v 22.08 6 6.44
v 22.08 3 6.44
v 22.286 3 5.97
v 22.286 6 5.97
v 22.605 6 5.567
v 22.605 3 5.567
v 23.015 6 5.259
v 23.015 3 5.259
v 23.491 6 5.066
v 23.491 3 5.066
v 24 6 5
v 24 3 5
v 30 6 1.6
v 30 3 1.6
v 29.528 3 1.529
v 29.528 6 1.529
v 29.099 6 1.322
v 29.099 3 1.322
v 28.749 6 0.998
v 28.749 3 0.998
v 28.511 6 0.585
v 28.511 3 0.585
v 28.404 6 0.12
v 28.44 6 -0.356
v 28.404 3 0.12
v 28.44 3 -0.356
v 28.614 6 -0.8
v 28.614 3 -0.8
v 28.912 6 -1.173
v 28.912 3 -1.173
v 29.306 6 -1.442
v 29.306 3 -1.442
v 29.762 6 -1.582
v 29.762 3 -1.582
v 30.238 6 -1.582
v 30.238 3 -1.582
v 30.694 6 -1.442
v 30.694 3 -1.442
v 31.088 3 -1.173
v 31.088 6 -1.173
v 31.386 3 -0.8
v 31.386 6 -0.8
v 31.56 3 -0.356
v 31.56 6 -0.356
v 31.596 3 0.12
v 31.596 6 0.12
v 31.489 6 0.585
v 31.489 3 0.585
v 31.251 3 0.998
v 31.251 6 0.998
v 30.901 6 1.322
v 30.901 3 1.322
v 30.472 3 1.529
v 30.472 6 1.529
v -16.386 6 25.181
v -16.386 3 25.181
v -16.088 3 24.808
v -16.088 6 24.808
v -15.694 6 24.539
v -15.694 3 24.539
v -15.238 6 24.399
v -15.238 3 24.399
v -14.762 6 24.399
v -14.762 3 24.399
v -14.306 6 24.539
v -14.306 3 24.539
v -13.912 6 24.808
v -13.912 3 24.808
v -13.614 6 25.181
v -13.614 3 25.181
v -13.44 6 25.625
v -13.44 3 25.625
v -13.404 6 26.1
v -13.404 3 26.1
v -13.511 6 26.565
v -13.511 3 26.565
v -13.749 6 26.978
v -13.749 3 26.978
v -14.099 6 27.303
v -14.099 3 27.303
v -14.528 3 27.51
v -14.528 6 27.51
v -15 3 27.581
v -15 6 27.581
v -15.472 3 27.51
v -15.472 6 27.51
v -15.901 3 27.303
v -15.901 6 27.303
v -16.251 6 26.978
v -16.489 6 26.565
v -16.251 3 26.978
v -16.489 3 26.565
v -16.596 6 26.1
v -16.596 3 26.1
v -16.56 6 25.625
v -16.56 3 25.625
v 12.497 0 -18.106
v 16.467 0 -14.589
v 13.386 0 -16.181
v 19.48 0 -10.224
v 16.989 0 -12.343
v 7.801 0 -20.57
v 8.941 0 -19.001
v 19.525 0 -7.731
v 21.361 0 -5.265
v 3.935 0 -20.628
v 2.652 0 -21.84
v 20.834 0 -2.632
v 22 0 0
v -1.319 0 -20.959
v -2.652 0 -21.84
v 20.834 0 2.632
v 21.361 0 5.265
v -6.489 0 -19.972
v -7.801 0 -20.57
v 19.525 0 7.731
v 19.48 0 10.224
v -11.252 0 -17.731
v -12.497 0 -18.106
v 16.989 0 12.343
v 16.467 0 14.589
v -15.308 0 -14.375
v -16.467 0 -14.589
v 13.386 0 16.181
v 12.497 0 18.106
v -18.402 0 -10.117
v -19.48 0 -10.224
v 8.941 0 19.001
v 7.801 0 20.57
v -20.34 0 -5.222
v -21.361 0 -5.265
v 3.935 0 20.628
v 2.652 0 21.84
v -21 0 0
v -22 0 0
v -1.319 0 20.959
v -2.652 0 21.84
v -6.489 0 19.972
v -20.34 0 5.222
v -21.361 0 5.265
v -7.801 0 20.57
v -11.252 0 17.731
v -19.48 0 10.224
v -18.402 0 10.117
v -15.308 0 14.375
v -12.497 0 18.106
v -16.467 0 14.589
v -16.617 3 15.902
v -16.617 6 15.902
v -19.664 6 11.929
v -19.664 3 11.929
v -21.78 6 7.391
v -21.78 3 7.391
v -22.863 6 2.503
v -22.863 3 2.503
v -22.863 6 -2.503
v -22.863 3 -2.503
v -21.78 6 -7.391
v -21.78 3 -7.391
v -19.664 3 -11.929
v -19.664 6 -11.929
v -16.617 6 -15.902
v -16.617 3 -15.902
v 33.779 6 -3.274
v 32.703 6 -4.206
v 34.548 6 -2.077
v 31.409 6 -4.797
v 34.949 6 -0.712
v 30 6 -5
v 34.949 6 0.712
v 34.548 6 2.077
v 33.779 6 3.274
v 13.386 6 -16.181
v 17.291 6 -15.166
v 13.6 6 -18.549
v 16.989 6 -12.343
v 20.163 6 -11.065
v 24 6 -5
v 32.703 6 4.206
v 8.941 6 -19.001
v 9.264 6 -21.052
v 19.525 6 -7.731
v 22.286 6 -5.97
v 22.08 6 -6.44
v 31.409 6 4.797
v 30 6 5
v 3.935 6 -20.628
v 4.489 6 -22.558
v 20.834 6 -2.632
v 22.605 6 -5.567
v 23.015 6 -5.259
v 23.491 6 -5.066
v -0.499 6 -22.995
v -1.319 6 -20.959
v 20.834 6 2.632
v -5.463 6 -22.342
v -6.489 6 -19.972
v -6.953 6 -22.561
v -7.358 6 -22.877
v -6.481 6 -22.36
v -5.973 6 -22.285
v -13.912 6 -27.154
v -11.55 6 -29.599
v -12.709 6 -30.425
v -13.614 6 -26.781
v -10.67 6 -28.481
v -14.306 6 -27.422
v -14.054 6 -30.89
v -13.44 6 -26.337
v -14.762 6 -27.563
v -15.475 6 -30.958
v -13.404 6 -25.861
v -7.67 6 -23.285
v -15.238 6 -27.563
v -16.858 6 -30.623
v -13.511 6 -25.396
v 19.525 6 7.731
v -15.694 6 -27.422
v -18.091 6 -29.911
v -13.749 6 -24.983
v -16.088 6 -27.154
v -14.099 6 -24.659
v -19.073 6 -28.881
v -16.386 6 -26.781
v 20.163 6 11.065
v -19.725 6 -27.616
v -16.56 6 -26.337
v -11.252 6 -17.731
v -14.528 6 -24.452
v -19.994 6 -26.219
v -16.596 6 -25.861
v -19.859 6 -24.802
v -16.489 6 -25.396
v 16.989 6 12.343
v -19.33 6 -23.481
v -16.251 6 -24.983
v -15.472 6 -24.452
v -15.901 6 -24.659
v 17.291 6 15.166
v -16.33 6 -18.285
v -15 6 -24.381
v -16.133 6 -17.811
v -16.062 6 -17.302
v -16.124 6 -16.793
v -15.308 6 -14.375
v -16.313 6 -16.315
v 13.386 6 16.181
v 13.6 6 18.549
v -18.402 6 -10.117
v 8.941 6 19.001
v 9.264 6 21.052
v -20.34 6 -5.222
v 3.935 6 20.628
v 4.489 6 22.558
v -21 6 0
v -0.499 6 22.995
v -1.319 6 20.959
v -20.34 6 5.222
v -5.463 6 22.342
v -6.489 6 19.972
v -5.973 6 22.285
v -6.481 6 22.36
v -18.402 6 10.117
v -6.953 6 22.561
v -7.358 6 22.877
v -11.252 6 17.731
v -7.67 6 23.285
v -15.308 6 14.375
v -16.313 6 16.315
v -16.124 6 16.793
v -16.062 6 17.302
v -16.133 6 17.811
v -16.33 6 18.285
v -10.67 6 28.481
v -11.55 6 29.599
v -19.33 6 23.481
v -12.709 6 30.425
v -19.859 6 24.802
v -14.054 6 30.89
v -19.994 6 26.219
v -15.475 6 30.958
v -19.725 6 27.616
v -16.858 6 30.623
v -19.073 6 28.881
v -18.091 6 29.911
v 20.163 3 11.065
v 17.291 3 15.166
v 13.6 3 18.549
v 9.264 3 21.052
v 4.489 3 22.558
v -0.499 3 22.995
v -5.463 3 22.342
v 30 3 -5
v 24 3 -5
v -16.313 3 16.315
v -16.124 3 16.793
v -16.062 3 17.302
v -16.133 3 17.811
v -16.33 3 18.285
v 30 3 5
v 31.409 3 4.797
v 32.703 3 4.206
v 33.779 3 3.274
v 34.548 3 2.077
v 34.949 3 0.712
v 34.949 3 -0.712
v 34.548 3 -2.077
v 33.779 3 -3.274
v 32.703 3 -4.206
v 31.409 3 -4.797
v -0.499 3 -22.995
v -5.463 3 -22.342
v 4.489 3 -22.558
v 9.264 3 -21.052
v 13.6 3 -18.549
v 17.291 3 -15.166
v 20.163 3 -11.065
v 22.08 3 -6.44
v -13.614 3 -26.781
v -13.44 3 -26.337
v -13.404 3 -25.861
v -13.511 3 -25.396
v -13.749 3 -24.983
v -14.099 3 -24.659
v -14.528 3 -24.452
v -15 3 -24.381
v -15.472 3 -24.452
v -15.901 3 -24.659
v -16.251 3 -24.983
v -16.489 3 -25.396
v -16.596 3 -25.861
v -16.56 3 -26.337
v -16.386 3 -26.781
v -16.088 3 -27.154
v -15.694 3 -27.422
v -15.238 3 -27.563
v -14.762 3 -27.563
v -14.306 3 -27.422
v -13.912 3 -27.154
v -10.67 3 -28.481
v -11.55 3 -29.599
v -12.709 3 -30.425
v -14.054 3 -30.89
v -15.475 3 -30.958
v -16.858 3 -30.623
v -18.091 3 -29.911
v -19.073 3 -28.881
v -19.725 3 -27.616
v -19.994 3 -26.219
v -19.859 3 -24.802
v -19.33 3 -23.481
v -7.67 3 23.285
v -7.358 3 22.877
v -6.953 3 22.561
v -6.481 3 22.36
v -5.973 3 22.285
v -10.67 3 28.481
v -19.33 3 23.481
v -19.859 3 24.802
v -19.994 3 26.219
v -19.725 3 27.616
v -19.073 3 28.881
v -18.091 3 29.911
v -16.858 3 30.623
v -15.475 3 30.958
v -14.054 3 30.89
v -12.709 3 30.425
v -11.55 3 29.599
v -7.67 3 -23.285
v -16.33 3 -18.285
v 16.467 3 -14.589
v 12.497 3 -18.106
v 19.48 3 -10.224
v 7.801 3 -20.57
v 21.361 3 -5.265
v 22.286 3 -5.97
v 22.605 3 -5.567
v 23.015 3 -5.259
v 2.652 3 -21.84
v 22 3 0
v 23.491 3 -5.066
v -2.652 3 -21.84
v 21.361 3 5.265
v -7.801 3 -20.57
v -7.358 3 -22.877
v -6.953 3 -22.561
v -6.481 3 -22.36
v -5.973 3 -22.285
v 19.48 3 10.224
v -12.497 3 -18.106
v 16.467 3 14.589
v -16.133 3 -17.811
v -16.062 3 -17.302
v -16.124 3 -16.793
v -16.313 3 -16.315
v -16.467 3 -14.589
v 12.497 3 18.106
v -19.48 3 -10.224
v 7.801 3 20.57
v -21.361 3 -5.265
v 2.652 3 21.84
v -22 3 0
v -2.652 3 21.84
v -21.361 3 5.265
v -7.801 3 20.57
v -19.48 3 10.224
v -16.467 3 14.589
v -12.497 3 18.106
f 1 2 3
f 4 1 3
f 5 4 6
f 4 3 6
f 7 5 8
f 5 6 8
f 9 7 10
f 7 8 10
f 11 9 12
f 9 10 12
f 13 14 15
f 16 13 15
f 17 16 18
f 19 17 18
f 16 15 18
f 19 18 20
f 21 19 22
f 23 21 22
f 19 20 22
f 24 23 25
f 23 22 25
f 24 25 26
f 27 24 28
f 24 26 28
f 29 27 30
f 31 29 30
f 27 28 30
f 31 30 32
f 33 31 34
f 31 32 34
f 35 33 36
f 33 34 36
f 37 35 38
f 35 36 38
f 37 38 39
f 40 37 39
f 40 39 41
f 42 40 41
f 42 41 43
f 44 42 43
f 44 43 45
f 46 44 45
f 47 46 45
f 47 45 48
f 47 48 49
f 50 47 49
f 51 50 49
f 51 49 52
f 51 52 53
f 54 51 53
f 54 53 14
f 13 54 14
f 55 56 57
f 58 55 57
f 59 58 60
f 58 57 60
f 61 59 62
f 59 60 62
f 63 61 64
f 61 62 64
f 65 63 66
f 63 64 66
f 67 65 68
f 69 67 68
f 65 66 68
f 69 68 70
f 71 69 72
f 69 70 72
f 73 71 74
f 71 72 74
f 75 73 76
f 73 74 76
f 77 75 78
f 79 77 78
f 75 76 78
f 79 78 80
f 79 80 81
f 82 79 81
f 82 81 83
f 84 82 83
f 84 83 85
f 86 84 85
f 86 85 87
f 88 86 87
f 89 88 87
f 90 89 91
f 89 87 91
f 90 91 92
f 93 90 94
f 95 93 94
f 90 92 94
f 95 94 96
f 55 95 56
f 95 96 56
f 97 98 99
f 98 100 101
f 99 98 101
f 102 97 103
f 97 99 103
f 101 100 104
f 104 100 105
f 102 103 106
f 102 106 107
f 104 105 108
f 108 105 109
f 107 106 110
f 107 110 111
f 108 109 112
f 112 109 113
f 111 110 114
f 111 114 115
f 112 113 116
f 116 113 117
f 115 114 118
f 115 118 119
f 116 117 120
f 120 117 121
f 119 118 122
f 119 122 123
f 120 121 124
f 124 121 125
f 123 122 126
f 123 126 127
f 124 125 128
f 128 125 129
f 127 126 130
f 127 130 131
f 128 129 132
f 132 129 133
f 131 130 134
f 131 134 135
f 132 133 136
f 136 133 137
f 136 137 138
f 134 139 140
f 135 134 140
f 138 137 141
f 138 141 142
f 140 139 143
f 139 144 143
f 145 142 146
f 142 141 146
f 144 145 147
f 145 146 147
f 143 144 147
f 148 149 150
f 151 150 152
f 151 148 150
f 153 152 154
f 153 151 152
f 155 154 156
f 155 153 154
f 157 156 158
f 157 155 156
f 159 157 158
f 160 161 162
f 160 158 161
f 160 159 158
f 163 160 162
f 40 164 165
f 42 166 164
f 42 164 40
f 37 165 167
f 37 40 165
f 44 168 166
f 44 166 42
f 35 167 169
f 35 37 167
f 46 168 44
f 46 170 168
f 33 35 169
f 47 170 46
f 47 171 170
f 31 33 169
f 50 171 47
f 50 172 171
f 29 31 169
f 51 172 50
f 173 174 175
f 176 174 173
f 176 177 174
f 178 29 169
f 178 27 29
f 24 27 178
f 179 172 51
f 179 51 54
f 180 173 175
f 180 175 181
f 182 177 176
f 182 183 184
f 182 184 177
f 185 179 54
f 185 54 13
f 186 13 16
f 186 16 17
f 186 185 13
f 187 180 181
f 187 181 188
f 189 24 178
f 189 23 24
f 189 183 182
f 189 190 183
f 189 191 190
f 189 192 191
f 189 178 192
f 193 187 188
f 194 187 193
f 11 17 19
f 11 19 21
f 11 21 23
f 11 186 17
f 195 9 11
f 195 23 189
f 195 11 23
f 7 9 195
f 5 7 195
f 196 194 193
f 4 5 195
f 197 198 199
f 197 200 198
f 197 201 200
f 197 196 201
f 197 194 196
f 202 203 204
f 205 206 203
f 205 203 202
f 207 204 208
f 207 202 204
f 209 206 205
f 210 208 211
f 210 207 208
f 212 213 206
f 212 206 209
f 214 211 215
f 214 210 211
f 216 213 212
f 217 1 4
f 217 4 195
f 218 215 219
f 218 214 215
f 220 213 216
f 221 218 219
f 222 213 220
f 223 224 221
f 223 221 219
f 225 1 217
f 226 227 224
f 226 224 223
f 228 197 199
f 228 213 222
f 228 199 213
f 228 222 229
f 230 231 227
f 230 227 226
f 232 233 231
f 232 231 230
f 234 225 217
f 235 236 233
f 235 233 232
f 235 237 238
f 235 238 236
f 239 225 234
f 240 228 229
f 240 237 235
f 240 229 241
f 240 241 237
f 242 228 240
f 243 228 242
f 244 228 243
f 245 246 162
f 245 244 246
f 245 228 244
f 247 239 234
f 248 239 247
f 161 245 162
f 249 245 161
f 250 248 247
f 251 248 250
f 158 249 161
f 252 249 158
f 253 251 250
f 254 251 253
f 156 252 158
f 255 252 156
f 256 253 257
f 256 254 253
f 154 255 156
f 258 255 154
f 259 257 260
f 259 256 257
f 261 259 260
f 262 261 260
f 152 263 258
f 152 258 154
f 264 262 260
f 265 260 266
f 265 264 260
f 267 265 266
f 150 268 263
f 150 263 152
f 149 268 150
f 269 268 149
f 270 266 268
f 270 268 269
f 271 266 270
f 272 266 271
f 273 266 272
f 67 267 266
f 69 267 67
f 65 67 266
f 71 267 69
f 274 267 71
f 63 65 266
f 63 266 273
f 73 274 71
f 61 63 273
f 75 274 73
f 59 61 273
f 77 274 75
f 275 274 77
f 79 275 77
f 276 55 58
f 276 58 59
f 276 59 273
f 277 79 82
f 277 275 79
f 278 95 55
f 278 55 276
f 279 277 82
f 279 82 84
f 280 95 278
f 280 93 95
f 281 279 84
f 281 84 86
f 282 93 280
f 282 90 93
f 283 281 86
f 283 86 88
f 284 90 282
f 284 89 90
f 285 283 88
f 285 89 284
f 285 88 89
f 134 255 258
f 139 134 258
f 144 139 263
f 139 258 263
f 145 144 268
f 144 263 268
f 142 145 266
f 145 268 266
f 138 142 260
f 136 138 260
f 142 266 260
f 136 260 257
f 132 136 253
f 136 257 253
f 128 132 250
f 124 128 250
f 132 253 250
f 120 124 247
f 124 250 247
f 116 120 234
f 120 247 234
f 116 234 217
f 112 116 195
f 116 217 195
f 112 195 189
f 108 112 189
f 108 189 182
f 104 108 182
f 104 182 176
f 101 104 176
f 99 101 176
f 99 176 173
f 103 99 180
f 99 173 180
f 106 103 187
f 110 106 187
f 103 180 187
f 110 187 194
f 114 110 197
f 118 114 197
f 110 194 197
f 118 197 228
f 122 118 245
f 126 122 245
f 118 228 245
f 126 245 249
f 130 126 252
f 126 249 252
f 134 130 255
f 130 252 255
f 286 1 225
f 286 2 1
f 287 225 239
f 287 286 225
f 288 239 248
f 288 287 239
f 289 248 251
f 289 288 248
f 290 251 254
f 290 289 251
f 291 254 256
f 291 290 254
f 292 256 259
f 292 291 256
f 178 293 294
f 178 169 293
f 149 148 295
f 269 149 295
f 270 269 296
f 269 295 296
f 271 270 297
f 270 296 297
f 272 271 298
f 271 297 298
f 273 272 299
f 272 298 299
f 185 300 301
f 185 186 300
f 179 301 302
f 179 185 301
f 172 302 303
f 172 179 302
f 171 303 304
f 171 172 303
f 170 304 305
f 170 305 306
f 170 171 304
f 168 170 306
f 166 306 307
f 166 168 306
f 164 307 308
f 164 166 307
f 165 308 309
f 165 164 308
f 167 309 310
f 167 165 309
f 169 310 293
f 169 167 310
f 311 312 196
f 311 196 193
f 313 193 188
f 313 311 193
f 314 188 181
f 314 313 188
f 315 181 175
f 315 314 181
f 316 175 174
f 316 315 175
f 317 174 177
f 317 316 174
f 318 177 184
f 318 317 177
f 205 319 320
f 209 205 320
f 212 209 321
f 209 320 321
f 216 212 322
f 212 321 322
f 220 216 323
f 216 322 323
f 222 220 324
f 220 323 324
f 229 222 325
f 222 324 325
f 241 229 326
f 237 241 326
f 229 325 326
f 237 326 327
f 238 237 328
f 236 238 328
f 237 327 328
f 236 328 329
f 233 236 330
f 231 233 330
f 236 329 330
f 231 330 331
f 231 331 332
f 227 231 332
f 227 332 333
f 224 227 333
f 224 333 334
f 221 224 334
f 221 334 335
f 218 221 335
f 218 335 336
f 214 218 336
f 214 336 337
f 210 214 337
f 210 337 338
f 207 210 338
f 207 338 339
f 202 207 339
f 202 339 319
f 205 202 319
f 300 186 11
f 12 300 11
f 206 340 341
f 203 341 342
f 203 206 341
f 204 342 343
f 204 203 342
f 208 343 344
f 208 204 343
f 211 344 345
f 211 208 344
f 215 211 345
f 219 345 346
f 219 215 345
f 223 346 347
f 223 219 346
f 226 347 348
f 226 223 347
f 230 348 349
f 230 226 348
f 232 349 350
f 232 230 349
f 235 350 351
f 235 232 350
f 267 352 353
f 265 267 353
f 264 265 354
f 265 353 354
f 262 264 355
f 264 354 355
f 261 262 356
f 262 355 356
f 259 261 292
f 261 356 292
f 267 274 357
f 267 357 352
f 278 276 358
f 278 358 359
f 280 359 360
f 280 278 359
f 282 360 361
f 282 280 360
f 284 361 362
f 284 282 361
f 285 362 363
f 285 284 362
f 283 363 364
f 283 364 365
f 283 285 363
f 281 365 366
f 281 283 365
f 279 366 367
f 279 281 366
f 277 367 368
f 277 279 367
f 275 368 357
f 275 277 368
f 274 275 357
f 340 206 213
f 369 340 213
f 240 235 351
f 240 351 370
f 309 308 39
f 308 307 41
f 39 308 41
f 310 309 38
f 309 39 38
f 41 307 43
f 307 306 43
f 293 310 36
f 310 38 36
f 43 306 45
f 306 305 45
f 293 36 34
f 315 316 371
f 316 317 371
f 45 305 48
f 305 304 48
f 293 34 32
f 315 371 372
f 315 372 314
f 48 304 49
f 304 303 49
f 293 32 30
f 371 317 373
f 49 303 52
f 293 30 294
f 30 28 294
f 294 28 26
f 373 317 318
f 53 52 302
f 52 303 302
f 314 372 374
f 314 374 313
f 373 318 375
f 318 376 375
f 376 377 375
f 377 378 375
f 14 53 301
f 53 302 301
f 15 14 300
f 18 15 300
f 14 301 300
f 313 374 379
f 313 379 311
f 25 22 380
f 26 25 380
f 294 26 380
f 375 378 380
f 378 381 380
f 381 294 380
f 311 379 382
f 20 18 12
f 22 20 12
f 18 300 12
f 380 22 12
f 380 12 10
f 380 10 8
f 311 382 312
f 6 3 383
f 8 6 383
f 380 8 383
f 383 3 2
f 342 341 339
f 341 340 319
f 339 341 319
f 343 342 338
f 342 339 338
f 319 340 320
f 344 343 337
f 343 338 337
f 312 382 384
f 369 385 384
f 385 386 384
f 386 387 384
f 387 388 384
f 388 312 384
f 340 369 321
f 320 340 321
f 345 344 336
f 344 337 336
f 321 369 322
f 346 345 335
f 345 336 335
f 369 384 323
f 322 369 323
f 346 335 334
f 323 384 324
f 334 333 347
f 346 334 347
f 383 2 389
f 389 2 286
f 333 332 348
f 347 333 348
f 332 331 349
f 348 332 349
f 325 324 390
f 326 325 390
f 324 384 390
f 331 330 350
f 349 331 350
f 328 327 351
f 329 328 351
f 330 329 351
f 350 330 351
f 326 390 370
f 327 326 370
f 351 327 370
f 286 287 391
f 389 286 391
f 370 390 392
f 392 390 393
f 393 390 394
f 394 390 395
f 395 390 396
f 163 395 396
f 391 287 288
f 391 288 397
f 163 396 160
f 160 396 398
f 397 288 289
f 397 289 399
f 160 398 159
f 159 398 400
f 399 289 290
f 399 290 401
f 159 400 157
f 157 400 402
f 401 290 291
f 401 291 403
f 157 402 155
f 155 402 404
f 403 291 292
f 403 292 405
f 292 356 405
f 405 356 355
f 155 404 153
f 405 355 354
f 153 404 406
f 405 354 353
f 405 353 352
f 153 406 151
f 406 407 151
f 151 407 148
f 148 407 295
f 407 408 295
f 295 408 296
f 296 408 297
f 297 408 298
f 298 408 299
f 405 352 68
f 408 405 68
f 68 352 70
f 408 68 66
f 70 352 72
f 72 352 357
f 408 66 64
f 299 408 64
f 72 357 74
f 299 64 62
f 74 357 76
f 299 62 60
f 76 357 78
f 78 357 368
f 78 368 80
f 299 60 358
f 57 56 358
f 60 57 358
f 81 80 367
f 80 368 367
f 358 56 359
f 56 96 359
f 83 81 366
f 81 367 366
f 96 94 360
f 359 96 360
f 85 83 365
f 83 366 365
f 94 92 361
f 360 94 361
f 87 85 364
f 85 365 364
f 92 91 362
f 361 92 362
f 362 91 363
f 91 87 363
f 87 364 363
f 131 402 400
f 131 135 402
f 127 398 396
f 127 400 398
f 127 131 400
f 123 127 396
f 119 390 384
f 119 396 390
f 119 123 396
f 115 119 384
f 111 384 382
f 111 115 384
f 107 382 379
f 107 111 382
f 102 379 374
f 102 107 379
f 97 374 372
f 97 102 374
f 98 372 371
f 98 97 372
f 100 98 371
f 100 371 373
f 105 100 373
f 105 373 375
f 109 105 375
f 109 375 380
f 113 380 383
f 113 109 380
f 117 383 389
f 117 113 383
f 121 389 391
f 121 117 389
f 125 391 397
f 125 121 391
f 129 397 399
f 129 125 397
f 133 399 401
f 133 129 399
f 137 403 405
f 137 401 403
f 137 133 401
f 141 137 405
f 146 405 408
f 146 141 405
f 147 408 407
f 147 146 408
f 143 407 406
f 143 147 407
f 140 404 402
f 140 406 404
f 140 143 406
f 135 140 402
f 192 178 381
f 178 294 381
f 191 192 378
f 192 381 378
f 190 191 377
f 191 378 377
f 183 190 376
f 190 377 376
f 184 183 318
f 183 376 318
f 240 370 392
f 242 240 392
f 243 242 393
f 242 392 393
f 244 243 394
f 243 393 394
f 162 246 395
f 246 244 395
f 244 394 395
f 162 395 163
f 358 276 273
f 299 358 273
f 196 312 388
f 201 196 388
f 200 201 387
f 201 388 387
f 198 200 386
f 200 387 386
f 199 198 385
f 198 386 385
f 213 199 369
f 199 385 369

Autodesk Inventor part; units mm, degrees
ref_plane "YZ Plane" through (0, 0, 0) normal (1, 0, 0) x (0, 1, 0)
ref_plane "XZ Plane" through (0, 0, 0) normal (0, 1, 0) x (-1, 0, 0)
ref_plane "XY Plane" through (0, 0, 0) normal (0, 0, 1) x (1, 0, 0)
sketch "Sketch1" plane through (0, 0, 0) normal (0, 0, 1) x (1, 0, 0)
  line L0 (-21, 0) -> (-21, 6)
  line L1 (-21, 6) -> (-23, 6)
  line L2 (-23, 6) -> (-23, 3)
  line L3 (-23, 3) -> (-22, 3)
  line L4 (-22, 3) -> (-22, 0)
  line L5 (-22, 0) -> (-21, 0)
  line L6 (0, -1.2) -> (0, 7.2) projected
  point P0 (0, 0)
  point P1 (-22, 1.5)
  dimension "d0" = 22
  dimension "d1" = 1
  dimension "d2" = 23
  dimension "d3" = 3
  dimension "d4" = 3
revolve "Revolution1" add sketch "Sketch1" angle 360 about axis through (0, -10, 0) along (0, 1, 0)
sketch "Sketch2" plane through (0, 6, 0) normal (0, 1, 0) x (1, 0, 0)
  circle A0 centre (0, 0) radius 30 construction
  circle A1 centre (30, 0) radius 5
  circle A2 centre (0, 0) radius 23 projected
  line L0 (30, 5) -> (22.4499, 5)
  line L1 (30, -5) -> (22.4499, -5)
  dimension "d6" = 60
  dimension "d7" = 10
extrude "Extrusion1" add sketch "Sketch2" against normal blind 3 contours A1 | A1 L1 A2 L0
fillet "Fillet1" radius 2 2 edges at (22.4499, 4.5, 5) (22.4499, 4.5, -5)
sketch "Sketch3" plane through (30, 6, 0) normal (0, 1, 0) x (1, 0, 0)
  arc A0 (0, -5) -> (0, 5) centre (0, 0) ccw projected
  point P0 (-30, 0)
hole "Hole1" at (30, 6, 0) direction (0, -1, 0) diameter 3.2 end through all clearance for "Flat Head Machine Screw" size "M3" standard "Ansi Metric M Profile"
pattern_circular "Circular Pattern1" count 3 over 360 about axis through (0, 3, 0) along (0, 1, 0) of "Extrusion1", "Hole1", "Fillet1"
properties part number "Electrode-Fixed-Press" material "Brass"
